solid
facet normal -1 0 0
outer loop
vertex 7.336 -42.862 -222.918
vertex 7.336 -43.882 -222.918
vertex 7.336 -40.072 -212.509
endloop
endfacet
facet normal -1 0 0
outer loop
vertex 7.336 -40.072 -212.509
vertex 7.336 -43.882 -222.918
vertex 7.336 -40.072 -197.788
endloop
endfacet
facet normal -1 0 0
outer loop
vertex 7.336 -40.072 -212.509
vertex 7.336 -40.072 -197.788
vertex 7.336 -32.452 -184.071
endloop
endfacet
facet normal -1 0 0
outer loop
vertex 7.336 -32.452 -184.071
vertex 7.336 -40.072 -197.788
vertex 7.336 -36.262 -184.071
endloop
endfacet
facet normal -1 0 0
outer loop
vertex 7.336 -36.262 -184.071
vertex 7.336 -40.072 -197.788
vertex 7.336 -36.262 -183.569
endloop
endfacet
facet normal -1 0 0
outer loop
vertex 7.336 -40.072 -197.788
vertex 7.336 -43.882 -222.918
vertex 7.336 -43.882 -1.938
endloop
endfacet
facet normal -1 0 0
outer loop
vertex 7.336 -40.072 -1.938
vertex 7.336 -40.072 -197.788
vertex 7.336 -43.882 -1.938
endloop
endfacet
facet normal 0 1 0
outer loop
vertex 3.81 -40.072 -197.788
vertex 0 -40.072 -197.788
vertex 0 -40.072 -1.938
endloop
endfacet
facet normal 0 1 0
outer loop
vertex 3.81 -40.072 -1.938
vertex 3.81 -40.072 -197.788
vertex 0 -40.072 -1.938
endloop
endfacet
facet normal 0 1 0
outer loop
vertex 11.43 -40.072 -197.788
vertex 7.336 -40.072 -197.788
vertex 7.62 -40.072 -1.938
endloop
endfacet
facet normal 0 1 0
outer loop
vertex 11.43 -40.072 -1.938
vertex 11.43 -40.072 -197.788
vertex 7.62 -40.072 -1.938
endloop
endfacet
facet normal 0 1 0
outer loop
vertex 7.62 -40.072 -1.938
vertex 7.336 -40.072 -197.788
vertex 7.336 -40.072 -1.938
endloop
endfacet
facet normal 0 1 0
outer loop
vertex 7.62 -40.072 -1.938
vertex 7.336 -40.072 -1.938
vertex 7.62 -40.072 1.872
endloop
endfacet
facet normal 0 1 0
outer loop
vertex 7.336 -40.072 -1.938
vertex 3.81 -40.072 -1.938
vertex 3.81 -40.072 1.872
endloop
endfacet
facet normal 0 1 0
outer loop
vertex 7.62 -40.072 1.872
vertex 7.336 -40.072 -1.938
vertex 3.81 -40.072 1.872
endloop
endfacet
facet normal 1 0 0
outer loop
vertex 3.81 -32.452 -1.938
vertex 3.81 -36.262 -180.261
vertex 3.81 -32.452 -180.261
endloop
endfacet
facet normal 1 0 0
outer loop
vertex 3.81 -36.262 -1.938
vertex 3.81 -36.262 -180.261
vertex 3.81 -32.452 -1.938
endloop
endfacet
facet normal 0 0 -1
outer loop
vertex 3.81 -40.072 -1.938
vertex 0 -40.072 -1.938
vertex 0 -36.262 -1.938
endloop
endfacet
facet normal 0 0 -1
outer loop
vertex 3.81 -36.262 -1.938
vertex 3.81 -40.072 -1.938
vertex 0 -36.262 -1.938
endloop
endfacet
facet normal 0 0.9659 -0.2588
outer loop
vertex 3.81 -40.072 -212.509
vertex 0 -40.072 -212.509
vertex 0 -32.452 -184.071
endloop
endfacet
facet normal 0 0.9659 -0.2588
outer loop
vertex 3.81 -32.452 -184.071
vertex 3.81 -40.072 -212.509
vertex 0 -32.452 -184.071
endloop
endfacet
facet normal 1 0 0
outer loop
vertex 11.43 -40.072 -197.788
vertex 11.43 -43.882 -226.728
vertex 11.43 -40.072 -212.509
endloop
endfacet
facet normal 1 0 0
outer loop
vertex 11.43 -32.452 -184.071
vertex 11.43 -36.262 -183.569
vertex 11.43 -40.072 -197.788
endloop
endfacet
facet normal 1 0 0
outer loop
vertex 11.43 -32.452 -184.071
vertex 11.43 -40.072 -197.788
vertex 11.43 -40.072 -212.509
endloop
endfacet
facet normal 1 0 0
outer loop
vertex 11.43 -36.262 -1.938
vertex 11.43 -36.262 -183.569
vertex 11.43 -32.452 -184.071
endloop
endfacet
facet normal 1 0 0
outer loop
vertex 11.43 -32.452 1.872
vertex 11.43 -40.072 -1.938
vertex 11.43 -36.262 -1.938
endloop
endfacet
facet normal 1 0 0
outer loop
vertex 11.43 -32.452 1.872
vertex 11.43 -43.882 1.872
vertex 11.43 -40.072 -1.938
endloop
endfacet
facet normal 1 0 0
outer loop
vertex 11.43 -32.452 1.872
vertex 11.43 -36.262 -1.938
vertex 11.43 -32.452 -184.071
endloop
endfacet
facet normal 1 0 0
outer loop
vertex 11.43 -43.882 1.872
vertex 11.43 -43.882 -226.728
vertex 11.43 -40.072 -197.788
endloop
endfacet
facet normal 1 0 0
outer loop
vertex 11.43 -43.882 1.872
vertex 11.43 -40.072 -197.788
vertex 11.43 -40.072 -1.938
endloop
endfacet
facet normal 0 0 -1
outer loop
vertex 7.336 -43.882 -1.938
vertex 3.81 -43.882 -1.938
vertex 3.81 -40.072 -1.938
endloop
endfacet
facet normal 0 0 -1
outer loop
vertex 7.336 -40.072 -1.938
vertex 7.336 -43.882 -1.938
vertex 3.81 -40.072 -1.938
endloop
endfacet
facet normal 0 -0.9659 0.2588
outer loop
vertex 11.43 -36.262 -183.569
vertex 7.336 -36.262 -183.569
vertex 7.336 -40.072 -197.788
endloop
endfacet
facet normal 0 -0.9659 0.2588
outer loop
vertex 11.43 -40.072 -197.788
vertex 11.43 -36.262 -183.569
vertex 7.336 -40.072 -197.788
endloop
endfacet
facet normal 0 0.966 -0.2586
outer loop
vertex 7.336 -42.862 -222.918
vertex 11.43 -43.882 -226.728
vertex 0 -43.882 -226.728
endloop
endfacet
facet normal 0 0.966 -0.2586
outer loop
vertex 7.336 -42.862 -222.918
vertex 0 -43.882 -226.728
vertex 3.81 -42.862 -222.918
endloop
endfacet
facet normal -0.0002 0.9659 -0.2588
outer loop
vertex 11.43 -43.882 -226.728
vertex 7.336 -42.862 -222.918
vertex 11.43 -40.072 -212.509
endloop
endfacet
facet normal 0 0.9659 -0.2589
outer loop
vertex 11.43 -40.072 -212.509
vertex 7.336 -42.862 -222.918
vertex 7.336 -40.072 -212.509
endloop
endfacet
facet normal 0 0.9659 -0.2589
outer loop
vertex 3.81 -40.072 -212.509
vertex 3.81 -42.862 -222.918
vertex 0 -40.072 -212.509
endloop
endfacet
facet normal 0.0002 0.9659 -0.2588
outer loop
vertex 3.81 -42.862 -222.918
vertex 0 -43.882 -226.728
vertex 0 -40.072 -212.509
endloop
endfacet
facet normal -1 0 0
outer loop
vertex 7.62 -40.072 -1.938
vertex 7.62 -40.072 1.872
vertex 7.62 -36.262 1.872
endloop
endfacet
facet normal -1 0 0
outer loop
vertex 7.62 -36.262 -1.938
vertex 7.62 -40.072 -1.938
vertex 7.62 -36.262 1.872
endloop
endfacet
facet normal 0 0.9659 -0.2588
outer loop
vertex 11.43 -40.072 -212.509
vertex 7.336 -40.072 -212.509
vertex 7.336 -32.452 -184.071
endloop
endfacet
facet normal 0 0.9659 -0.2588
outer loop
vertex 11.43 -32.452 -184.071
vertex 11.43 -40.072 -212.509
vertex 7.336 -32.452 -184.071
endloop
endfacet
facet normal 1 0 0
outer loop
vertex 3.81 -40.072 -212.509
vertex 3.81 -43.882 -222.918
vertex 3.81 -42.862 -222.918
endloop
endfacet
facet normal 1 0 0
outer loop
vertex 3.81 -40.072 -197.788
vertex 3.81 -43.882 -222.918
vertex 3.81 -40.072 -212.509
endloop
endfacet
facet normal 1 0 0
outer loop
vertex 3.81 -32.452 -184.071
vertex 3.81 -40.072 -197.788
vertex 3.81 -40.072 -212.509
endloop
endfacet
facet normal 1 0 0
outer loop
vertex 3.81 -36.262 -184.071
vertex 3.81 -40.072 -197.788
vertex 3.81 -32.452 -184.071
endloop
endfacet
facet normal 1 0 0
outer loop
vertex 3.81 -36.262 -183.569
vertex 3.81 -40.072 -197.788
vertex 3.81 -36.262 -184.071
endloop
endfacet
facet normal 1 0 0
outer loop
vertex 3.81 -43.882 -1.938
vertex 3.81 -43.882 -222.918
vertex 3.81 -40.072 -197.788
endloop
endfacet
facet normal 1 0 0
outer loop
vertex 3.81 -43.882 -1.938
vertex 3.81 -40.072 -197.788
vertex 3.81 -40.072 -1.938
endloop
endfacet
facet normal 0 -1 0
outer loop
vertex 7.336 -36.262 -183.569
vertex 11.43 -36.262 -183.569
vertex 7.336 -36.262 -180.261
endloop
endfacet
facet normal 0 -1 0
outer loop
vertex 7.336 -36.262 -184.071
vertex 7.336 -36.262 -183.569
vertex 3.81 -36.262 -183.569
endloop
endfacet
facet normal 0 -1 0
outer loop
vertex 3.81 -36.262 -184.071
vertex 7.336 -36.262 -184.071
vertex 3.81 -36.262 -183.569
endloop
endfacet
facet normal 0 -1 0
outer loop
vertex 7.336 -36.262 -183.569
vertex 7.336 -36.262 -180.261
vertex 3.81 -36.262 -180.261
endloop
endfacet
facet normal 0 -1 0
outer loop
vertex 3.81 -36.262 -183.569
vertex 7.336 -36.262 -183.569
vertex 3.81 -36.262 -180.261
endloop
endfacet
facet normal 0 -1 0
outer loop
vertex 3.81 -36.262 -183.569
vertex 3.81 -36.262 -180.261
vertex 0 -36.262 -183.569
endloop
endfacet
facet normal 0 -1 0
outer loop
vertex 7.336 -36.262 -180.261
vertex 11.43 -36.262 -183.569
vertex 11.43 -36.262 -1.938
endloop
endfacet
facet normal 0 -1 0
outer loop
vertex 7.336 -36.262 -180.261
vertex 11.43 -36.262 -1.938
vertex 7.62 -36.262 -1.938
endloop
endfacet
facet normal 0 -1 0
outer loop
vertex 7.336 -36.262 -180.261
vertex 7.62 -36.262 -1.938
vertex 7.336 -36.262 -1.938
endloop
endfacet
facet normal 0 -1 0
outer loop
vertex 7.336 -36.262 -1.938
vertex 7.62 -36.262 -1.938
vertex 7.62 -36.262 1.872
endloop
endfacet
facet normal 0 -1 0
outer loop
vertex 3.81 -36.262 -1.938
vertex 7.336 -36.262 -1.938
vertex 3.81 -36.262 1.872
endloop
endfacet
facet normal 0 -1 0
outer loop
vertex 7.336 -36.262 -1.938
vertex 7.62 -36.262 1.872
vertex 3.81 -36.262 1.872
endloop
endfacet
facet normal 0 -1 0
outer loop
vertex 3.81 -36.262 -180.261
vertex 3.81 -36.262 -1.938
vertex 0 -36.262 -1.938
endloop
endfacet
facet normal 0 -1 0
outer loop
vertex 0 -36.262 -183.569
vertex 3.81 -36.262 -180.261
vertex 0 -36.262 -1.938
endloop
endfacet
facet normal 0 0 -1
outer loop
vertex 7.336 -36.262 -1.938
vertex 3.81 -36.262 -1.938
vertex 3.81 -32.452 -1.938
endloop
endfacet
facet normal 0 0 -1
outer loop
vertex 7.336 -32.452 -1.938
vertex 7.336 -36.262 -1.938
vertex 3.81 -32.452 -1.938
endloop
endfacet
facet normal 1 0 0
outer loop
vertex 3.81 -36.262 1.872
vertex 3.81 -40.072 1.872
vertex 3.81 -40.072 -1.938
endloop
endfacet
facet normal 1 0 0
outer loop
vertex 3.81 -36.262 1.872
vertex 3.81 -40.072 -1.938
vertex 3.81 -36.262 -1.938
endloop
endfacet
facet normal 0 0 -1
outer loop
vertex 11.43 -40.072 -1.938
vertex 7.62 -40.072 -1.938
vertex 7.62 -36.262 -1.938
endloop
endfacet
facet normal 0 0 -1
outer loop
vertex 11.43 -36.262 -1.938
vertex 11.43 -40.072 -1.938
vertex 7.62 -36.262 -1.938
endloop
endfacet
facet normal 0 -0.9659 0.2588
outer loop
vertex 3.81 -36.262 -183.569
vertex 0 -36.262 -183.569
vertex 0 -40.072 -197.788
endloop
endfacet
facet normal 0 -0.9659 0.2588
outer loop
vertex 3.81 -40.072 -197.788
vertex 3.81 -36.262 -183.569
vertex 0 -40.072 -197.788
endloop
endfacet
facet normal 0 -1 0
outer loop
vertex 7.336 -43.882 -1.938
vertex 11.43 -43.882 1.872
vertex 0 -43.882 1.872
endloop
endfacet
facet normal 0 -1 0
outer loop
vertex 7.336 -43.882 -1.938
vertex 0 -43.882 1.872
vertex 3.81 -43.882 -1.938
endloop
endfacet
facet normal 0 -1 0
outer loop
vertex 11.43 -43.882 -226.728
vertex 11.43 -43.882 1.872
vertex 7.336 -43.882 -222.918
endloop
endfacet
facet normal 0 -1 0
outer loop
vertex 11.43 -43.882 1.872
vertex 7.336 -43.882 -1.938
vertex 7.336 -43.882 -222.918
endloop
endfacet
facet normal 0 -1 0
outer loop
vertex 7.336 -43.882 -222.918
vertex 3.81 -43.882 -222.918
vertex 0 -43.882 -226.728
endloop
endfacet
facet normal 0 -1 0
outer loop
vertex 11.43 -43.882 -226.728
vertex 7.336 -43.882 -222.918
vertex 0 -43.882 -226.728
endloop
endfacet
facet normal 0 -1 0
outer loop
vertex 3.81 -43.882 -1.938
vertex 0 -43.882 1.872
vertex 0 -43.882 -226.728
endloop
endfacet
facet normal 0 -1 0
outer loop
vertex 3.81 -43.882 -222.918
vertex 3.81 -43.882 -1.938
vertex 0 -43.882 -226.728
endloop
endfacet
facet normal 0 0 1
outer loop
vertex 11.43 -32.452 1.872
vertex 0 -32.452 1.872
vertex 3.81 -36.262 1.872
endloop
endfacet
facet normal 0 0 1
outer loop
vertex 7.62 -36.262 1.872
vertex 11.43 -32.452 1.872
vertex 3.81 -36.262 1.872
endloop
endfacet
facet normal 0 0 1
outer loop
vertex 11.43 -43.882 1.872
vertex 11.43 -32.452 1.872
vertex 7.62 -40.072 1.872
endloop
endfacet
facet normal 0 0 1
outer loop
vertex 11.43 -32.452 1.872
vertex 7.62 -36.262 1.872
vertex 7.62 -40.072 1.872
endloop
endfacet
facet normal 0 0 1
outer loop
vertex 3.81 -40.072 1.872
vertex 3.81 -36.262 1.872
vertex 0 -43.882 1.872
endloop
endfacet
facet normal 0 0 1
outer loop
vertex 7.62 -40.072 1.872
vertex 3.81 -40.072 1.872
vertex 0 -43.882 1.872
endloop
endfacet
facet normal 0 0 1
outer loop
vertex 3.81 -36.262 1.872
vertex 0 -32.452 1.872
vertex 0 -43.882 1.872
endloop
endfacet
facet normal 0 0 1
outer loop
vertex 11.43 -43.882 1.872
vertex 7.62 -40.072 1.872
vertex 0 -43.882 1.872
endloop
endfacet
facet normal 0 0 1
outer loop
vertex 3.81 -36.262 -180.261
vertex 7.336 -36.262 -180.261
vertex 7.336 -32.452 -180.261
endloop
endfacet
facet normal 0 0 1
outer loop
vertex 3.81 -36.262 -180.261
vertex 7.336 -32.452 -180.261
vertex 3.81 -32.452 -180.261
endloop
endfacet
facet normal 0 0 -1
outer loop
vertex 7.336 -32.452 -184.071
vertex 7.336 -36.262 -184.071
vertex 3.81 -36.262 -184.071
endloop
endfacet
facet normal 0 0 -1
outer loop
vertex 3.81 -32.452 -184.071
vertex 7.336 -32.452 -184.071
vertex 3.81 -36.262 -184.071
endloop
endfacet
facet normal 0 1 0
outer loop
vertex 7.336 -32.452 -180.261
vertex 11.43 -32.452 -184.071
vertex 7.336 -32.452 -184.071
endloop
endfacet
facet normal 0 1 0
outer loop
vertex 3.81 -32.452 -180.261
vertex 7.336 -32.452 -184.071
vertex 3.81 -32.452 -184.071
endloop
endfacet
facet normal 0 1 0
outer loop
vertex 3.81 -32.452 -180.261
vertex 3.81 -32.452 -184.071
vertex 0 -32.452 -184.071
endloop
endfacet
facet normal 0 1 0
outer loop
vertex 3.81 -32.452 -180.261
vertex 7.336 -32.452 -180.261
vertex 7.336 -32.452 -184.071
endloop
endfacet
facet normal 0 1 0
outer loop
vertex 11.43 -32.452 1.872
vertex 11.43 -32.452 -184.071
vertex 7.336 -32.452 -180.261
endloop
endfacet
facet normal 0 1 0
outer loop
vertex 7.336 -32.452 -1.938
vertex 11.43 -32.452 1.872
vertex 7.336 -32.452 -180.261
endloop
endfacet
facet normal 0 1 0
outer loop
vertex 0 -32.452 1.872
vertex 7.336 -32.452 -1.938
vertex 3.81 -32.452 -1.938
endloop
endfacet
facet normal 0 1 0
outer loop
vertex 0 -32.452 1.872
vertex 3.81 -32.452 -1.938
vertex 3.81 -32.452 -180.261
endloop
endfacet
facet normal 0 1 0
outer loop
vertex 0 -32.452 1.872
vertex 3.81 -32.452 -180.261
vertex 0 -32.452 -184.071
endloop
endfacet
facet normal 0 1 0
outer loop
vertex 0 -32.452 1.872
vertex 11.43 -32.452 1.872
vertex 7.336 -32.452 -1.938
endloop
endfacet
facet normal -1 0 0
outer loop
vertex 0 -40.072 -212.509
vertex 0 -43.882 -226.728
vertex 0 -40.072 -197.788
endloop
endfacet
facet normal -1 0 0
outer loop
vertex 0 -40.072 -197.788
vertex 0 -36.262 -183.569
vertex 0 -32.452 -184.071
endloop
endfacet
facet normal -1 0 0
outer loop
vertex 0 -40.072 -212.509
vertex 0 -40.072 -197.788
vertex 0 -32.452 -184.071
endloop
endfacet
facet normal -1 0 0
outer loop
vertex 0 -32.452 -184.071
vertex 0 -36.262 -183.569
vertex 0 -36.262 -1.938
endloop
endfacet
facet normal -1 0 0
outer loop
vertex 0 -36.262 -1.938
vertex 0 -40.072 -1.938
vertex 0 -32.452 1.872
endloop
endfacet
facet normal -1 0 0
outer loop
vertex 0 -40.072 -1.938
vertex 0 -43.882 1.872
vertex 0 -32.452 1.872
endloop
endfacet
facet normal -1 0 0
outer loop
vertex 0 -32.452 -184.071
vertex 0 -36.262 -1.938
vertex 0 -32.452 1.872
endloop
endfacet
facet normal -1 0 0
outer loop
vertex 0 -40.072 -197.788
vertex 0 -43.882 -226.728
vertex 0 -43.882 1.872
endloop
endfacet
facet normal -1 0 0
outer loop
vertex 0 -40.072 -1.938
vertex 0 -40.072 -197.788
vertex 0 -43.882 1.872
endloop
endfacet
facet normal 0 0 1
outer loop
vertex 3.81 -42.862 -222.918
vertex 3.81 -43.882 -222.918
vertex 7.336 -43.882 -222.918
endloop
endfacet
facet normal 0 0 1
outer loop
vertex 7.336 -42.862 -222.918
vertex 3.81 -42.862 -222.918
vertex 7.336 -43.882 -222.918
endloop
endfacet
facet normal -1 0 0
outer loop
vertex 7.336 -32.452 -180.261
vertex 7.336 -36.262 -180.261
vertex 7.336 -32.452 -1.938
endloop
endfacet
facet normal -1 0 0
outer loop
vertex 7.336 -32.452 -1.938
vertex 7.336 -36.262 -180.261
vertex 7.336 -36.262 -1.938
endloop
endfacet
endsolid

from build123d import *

# Parameters (mm, degrees)
F0_W     = 3.81
F0_H     = 3.81
F1_DEPTH = 11.43
F2_W     = 3.5260741734
F2_H     = 220.98
F3_DEPTH = 25.4
F4_W     = 3.5260741734
F4_H     = 3.81
F5_DEPTH = 3.81
F6_W     = 3.81
F6_H     = 3.81
F7_DEPTH = 25.4


with BuildPart() as f1:
    # F0 (on Right) → F1 (new body)
    with BuildSketch(Plane.YZ):
        with Locations((-41.9773963976, -0.0329993901)):
            Rectangle(F0_W, F0_H)
        with Locations((-38.1673963976, -0.0329993901)):
            Rectangle(F0_W, F0_H)
        Polygon((-40.0723963976, -1.9379993901), (-43.8823963976, -1.9379993901), (-43.8823963976, -212.0072897974), (-40.0723963976, -197.7881762206), align=None)
        with Locations((-34.3573963976, -0.0329993901)):
            Rectangle(F0_W, F0_H)
        Polygon((-40.0723963976, -197.7881762206), (-43.8823963976, -212.0072897974), (-43.8823963976, -226.7279993901), (-40.0723963976, -212.5088858132), align=None)
        Polygon((-32.4523963976, -1.9379993901), (-36.2623963976, -1.9379993901), (-36.2623963976, -183.5690626437), (-32.4523963976, -169.3499490669), align=None)
        Polygon((-36.2623963976, -183.5690626437), (-40.0723963976, -197.7881762206), (-40.0723963976, -212.5088858132), (-36.2623963976, -198.2897722364), align=None)
        Polygon((-32.4523963976, -169.3499490669), (-36.2623963976, -183.5690626437), (-36.2623963976, -198.2897722364), (-32.4523963976, -184.0706586596), align=None)
    extrude(amount=F1_DEPTH)

    # F2 (on face) → F3 (cut)
    with BuildSketch(Plane.XZ.offset(43.8823963976)):
        with Locations((5.5730370867, -112.4279993901)):
            Rectangle(F2_W, F2_H)
    extrude(amount=-F3_DEPTH, mode=Mode.SUBTRACT)

    # F4 (on face) → F5 (join)
    with BuildSketch(Plane(origin=(0, -32.4523963976, 0), x_dir=(-1, 0, 0), z_dir=(0, 1, 0))):
        with Locations((-5.5730370867, -182.1656586596)):
            Rectangle(F4_W, F4_H)
    extrude(amount=-F5_DEPTH)

    # F6 (on face) → F7 (cut)
    with BuildSketch(Plane.XY.offset(1.8720006099)):
        with Locations((5.715, -38.1673963976)):
            Rectangle(F6_W, F6_H)
    extrude(amount=-F7_DEPTH, mode=Mode.SUBTRACT)


solid = f1.part
